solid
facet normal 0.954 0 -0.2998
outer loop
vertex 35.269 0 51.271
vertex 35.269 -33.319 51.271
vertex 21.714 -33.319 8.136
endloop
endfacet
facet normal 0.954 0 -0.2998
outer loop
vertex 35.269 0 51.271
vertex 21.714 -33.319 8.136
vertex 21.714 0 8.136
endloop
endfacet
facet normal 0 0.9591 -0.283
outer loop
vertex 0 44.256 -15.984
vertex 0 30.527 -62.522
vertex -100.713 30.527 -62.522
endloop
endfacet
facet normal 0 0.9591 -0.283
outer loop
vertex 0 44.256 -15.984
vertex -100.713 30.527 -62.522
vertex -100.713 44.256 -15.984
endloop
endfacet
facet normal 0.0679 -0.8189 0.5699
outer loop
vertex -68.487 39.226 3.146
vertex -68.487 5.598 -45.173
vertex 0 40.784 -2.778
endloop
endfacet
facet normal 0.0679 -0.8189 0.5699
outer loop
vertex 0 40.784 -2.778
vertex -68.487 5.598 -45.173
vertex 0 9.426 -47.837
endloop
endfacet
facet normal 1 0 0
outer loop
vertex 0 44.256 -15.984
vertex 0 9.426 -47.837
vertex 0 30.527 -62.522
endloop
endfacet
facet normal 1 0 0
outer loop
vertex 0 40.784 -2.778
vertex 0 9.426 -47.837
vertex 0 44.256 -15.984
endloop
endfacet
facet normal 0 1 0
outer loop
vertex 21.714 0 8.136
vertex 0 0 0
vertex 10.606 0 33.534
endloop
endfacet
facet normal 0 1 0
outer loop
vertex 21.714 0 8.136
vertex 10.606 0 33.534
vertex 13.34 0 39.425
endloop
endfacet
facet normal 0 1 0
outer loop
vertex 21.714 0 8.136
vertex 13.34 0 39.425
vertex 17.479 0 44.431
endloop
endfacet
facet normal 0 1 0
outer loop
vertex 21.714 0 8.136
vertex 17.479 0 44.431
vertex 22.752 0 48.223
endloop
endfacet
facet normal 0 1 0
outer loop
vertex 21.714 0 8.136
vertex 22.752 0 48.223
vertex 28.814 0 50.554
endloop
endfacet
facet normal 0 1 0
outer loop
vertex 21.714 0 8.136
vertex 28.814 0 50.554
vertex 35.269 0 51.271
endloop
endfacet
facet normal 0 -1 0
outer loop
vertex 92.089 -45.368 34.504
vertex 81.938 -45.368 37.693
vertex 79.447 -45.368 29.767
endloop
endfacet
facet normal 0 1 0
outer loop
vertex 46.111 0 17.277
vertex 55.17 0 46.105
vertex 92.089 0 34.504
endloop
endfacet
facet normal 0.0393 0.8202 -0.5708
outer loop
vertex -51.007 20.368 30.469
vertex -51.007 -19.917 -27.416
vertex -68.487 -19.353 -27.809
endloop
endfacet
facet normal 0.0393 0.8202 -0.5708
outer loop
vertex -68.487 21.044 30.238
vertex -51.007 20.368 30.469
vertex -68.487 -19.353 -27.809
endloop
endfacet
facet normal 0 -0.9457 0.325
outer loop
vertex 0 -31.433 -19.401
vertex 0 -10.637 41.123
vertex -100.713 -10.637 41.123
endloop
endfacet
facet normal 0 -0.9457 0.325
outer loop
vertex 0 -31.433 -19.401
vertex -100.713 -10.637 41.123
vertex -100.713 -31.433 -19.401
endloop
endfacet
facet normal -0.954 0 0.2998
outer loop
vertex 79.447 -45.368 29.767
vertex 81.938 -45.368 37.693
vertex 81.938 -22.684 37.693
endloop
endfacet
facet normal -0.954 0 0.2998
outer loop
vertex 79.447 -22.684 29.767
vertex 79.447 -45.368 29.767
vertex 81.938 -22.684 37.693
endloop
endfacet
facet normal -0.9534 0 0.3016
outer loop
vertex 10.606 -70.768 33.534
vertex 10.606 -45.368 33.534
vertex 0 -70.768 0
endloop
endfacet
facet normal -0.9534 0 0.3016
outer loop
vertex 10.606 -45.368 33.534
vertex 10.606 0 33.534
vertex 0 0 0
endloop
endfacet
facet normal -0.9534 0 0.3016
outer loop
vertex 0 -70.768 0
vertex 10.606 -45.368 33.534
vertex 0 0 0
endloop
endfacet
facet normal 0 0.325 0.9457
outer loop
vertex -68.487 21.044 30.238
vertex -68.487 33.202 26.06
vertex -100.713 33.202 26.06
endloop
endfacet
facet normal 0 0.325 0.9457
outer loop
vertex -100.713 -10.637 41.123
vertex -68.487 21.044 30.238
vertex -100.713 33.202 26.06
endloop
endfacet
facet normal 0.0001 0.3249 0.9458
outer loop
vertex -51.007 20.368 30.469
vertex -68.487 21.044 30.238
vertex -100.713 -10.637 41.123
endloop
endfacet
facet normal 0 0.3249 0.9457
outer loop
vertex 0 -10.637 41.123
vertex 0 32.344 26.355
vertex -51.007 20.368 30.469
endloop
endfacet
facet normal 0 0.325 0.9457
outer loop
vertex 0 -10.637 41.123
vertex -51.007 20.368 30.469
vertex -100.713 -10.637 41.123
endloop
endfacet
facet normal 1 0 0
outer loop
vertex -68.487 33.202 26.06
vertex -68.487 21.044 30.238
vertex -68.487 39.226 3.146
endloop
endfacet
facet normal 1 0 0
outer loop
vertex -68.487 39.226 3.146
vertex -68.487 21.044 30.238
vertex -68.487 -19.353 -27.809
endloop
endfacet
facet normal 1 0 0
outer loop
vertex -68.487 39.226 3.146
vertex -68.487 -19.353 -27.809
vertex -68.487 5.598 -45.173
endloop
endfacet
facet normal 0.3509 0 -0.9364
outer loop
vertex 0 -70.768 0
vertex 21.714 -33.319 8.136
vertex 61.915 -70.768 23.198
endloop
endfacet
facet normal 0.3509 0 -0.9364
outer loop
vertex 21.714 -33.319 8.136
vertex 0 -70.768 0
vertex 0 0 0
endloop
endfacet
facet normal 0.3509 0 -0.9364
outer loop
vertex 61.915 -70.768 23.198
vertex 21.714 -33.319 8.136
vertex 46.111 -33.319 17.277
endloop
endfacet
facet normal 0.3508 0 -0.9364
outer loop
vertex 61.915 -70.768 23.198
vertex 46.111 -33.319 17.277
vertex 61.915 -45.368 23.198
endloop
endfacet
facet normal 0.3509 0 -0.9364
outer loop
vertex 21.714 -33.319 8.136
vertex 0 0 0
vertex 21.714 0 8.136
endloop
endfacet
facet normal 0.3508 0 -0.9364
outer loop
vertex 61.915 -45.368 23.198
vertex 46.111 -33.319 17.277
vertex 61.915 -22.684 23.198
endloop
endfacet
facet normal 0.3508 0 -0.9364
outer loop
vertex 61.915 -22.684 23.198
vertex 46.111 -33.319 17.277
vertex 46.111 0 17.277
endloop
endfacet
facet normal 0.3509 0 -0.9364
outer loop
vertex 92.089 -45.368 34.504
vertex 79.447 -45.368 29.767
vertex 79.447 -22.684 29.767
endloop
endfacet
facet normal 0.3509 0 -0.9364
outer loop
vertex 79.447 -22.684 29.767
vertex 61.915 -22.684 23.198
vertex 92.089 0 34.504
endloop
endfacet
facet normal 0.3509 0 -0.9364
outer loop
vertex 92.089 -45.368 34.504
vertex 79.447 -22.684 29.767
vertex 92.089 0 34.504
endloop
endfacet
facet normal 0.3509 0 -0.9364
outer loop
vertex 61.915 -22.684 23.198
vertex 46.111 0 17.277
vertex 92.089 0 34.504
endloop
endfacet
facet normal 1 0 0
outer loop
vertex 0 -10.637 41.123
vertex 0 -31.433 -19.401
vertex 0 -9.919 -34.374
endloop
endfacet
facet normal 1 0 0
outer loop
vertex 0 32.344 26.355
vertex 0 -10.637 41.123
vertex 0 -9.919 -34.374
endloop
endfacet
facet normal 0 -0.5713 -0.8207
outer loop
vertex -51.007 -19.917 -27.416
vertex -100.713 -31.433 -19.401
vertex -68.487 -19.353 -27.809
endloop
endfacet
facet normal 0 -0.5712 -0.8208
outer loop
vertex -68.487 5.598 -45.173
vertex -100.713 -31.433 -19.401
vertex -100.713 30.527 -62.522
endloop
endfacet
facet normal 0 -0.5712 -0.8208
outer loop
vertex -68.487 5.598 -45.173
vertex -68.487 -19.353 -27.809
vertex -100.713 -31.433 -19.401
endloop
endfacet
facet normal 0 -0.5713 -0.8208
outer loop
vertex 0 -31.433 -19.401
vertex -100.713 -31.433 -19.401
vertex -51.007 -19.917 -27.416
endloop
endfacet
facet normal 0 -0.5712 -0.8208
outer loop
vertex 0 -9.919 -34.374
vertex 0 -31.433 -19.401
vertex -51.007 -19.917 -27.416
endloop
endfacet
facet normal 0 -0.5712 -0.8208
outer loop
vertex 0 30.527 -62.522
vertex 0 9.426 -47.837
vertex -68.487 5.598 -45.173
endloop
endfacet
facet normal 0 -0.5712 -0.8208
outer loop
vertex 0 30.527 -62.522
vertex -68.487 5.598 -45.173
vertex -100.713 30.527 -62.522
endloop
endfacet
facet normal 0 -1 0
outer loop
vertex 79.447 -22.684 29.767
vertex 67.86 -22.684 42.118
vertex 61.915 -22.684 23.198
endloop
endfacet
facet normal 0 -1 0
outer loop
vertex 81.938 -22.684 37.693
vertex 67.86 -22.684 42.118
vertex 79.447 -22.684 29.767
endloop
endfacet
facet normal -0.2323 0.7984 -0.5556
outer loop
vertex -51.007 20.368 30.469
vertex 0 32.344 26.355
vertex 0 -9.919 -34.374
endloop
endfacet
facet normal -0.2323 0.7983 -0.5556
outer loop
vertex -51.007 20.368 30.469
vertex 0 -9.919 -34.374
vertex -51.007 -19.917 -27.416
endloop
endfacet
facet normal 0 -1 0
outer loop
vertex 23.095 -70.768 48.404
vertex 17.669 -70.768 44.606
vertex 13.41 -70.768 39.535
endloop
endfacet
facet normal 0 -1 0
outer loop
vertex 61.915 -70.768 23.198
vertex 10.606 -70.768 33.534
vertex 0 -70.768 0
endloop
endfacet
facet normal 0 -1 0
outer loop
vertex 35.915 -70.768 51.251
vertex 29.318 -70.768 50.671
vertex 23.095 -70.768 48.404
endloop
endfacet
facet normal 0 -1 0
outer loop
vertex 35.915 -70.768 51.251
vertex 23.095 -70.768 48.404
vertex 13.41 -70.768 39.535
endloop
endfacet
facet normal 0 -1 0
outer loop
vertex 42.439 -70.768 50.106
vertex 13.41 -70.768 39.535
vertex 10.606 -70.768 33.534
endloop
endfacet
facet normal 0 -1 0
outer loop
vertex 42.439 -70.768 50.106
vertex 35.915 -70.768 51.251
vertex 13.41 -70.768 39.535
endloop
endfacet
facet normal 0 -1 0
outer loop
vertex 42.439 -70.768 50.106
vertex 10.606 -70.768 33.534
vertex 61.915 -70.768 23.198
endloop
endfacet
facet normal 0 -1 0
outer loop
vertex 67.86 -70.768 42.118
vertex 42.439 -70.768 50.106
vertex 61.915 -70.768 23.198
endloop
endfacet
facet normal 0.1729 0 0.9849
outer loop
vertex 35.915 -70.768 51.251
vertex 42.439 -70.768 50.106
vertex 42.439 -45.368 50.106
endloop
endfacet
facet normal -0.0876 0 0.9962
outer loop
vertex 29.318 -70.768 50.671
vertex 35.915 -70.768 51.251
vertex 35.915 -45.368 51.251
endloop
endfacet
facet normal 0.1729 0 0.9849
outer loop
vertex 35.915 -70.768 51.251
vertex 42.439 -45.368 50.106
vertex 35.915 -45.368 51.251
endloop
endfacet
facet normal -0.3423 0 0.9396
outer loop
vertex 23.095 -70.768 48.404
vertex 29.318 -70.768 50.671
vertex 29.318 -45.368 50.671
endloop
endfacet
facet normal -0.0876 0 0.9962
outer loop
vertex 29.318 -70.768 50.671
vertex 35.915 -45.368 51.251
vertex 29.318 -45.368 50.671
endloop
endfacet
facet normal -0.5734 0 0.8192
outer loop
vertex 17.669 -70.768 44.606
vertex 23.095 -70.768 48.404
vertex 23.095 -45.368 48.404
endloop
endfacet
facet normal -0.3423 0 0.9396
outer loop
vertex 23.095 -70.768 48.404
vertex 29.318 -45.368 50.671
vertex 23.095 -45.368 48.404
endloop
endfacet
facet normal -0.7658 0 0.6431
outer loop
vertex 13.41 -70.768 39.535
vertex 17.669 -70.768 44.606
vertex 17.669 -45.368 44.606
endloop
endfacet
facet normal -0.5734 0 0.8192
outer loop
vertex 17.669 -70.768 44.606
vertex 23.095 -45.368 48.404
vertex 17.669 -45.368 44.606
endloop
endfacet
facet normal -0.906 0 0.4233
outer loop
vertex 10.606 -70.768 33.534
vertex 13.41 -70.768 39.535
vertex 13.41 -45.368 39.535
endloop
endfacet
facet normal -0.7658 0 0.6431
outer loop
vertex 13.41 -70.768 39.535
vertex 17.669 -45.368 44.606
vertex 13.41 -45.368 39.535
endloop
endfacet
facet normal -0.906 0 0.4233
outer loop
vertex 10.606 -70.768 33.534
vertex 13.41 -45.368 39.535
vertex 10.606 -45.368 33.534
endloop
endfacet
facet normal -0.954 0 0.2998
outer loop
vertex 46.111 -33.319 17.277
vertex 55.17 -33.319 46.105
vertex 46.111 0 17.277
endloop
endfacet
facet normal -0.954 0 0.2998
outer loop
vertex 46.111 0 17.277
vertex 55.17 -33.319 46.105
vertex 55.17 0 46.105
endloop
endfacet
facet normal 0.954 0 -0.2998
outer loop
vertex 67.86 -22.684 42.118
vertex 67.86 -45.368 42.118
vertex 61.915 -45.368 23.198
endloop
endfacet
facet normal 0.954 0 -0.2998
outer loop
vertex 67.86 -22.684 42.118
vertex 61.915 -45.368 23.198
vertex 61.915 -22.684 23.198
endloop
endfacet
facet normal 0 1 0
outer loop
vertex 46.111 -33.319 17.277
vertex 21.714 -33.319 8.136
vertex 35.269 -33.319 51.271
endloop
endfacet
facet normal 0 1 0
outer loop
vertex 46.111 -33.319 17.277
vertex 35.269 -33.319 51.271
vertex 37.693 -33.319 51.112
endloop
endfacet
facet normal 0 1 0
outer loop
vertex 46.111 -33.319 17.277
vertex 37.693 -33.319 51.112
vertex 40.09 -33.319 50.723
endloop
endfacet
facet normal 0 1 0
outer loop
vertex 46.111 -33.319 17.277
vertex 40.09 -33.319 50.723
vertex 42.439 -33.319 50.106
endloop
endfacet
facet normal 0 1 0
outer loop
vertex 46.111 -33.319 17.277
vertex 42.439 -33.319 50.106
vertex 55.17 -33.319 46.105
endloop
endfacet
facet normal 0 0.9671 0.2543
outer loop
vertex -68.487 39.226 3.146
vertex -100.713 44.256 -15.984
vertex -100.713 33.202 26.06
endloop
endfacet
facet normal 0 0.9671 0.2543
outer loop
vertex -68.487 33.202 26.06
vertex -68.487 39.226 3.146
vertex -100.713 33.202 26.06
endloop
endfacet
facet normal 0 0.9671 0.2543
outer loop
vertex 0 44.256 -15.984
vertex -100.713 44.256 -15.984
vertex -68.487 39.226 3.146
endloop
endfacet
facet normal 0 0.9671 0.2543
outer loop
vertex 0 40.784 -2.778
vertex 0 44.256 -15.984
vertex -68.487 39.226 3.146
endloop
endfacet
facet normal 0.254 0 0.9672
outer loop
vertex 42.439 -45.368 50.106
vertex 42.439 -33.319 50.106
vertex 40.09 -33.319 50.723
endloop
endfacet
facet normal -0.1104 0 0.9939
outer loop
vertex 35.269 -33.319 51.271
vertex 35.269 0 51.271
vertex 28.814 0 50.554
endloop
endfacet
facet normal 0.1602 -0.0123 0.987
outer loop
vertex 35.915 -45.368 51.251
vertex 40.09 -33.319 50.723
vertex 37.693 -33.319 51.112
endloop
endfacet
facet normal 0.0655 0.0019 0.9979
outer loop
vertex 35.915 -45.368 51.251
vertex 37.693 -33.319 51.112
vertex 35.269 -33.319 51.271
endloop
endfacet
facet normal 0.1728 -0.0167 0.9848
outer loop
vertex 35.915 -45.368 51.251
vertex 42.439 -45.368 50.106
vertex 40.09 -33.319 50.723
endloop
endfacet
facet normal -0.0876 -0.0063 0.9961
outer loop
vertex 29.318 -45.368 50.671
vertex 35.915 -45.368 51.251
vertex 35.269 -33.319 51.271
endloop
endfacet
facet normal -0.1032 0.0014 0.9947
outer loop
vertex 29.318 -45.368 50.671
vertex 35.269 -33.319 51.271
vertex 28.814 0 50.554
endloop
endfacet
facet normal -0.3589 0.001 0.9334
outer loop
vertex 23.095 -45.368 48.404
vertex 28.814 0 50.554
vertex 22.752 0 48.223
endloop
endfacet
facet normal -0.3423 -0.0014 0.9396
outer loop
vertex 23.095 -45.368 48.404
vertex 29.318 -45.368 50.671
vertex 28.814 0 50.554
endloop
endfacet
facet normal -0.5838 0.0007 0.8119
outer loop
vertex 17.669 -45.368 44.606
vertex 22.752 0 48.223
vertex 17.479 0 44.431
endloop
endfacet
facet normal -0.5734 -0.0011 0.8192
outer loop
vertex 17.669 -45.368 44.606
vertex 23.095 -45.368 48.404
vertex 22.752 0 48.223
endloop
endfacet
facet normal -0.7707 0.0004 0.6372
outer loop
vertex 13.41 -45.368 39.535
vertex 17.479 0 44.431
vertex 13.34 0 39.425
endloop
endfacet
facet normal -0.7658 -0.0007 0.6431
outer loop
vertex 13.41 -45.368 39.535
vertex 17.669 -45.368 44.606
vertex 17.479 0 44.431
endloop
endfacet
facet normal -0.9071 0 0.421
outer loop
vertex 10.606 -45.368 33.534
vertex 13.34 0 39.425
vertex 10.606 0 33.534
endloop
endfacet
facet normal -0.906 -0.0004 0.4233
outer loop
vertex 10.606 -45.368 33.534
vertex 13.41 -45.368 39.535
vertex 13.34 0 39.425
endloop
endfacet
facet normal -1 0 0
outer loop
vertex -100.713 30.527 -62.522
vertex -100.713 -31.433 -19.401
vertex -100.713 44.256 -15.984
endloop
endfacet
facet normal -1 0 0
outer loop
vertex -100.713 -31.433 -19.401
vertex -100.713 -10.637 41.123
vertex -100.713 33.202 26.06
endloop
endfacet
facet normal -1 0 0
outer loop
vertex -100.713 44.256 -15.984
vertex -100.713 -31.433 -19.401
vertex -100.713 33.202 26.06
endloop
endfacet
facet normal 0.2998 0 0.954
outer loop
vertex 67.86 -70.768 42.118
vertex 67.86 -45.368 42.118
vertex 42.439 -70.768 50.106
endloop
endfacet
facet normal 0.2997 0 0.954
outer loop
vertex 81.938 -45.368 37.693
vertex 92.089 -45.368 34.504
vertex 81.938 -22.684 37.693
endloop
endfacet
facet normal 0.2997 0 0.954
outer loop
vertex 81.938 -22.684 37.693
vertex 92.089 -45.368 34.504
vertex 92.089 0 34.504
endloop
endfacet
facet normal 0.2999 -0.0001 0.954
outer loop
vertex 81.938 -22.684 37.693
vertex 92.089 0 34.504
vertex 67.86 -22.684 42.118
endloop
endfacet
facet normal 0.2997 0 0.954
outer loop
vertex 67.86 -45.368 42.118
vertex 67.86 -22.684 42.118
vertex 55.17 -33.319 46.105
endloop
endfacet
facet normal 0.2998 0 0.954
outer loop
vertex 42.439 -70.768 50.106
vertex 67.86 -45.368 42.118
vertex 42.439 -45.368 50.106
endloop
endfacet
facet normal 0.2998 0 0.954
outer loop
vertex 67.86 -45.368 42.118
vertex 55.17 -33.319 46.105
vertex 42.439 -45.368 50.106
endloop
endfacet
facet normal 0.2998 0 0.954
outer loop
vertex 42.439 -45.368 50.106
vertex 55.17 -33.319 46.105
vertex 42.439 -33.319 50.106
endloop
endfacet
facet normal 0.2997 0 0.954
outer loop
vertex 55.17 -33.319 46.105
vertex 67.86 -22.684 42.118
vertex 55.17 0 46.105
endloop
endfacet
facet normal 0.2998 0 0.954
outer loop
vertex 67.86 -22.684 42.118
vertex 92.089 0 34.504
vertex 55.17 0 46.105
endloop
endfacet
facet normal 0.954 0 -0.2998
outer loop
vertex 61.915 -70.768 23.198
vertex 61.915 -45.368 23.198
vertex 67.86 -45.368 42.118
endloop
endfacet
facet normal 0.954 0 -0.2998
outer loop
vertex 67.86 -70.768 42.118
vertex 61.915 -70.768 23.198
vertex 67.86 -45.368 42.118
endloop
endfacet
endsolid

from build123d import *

# Parameters (mm, degrees)
F1_DEPTH = 45.3683566302
F2_W     = 20.5338352643
F2_H     = 33.3187319338
F2_W_2   = 14.7568359971
F2_H_2   = 22.6841783151
F3_DEPTH = 93.0456835777
F4_R     = 25.4
F5_DEPTH = 25.4
F7_DEPTH = 100.7131207734
F9_DEPTH = 137.8182396293


with BuildPart() as f1:
    # F0 (on Front) → F1 (new body)
    with BuildSketch(Plane.XZ):
        Polygon((0, 0), (92.0885801315, 34.503582865), (18.2516984642, 57.7072314918), align=None)
    extrude(amount=F1_DEPTH)

    # F2 (on face) → F3 (cut)
    with BuildSketch(Plane(origin=(18.145322164, 0, 57.7406608327), x_dir=(0.9540019522, 0, -0.2998003923), z_dir=(0.2998003923, 0, 0.9540019522))):
        with Locations((28.543083803, -16.6593659669)):
            Rectangle(F2_W, F2_H)
        with Locations((59.4902671874, -34.0262674727)):
            Rectangle(F2_W_2, F2_H_2)
    extrude(amount=-F3_DEPTH, mode=Mode.SUBTRACT)

    # F4
    f4_edges = [f1.edges().sort_by_distance(p)[0] for p in [
        (18.251698, -22.684178, 57.707231),
    ]]
    fillet(f4_edges, radius=F4_R)

    # F3_face (on face) → F5 (join)
    with BuildSketch(Plane(origin=(33.0328934658, -45.3683566302, 29.0065580598), x_dir=(1, 0, 0), z_dir=(0, -1, 0))):
        with BuildLine():
            Line((-22.4266559228, 4.5276692535), (-33.0328934658, -29.0065580598))
            Line((-33.0328934658, -29.0065580598), (28.8816881862, -5.8085144421))
            Line((28.8816881862, -5.8085144421), (34.8272345569, 13.1109499441))
            Line((34.8272345569, 13.1109499441), (9.4058534529, 21.0997596206))
            ThreePointArc((9.4058534529, 21.0997596206), (-9.9381232307, 19.3978562172), (-22.4266559228, 4.5276692535))
        make_face()
    extrude(amount=F5_DEPTH)


with BuildPart() as f7:
    # F6 (on Right) → F7 (new body)
    with BuildSketch(Plane.YZ):
        Polygon((44.2555435002, -15.9842148423), (33.2021676004, 26.0598286986), (-10.6371901929, 41.1229655147), (-31.4333016958, -19.4014912449), (30.5266529322, -62.5218972564), align=None)
    extrude(amount=-F7_DEPTH)

    # F8 (on face) → F9 (cut)
    with BuildSketch(Plane(origin=(0, -19.3531034318, -27.8085834865), x_dir=(1, 0, 0), z_dir=(0, -0.5712236373, -0.8207944665))):
        Polygon((0, -11.4934974662), (0, -35.0619731547), (11.7985904217, -35.8652435243), (7.1338117123, -13.1969898939), align=None)
        Polygon((-51.0072931647, 0.6866022013), (-68.487226963, 0), (-68.487226963, -30.3992331028), (0, -35.0619731547), (0, -11.4934974662), align=None)
    extrude(amount=-F9_DEPTH, mode=Mode.SUBTRACT)


solid = Compound([f1.part, f7.part])
